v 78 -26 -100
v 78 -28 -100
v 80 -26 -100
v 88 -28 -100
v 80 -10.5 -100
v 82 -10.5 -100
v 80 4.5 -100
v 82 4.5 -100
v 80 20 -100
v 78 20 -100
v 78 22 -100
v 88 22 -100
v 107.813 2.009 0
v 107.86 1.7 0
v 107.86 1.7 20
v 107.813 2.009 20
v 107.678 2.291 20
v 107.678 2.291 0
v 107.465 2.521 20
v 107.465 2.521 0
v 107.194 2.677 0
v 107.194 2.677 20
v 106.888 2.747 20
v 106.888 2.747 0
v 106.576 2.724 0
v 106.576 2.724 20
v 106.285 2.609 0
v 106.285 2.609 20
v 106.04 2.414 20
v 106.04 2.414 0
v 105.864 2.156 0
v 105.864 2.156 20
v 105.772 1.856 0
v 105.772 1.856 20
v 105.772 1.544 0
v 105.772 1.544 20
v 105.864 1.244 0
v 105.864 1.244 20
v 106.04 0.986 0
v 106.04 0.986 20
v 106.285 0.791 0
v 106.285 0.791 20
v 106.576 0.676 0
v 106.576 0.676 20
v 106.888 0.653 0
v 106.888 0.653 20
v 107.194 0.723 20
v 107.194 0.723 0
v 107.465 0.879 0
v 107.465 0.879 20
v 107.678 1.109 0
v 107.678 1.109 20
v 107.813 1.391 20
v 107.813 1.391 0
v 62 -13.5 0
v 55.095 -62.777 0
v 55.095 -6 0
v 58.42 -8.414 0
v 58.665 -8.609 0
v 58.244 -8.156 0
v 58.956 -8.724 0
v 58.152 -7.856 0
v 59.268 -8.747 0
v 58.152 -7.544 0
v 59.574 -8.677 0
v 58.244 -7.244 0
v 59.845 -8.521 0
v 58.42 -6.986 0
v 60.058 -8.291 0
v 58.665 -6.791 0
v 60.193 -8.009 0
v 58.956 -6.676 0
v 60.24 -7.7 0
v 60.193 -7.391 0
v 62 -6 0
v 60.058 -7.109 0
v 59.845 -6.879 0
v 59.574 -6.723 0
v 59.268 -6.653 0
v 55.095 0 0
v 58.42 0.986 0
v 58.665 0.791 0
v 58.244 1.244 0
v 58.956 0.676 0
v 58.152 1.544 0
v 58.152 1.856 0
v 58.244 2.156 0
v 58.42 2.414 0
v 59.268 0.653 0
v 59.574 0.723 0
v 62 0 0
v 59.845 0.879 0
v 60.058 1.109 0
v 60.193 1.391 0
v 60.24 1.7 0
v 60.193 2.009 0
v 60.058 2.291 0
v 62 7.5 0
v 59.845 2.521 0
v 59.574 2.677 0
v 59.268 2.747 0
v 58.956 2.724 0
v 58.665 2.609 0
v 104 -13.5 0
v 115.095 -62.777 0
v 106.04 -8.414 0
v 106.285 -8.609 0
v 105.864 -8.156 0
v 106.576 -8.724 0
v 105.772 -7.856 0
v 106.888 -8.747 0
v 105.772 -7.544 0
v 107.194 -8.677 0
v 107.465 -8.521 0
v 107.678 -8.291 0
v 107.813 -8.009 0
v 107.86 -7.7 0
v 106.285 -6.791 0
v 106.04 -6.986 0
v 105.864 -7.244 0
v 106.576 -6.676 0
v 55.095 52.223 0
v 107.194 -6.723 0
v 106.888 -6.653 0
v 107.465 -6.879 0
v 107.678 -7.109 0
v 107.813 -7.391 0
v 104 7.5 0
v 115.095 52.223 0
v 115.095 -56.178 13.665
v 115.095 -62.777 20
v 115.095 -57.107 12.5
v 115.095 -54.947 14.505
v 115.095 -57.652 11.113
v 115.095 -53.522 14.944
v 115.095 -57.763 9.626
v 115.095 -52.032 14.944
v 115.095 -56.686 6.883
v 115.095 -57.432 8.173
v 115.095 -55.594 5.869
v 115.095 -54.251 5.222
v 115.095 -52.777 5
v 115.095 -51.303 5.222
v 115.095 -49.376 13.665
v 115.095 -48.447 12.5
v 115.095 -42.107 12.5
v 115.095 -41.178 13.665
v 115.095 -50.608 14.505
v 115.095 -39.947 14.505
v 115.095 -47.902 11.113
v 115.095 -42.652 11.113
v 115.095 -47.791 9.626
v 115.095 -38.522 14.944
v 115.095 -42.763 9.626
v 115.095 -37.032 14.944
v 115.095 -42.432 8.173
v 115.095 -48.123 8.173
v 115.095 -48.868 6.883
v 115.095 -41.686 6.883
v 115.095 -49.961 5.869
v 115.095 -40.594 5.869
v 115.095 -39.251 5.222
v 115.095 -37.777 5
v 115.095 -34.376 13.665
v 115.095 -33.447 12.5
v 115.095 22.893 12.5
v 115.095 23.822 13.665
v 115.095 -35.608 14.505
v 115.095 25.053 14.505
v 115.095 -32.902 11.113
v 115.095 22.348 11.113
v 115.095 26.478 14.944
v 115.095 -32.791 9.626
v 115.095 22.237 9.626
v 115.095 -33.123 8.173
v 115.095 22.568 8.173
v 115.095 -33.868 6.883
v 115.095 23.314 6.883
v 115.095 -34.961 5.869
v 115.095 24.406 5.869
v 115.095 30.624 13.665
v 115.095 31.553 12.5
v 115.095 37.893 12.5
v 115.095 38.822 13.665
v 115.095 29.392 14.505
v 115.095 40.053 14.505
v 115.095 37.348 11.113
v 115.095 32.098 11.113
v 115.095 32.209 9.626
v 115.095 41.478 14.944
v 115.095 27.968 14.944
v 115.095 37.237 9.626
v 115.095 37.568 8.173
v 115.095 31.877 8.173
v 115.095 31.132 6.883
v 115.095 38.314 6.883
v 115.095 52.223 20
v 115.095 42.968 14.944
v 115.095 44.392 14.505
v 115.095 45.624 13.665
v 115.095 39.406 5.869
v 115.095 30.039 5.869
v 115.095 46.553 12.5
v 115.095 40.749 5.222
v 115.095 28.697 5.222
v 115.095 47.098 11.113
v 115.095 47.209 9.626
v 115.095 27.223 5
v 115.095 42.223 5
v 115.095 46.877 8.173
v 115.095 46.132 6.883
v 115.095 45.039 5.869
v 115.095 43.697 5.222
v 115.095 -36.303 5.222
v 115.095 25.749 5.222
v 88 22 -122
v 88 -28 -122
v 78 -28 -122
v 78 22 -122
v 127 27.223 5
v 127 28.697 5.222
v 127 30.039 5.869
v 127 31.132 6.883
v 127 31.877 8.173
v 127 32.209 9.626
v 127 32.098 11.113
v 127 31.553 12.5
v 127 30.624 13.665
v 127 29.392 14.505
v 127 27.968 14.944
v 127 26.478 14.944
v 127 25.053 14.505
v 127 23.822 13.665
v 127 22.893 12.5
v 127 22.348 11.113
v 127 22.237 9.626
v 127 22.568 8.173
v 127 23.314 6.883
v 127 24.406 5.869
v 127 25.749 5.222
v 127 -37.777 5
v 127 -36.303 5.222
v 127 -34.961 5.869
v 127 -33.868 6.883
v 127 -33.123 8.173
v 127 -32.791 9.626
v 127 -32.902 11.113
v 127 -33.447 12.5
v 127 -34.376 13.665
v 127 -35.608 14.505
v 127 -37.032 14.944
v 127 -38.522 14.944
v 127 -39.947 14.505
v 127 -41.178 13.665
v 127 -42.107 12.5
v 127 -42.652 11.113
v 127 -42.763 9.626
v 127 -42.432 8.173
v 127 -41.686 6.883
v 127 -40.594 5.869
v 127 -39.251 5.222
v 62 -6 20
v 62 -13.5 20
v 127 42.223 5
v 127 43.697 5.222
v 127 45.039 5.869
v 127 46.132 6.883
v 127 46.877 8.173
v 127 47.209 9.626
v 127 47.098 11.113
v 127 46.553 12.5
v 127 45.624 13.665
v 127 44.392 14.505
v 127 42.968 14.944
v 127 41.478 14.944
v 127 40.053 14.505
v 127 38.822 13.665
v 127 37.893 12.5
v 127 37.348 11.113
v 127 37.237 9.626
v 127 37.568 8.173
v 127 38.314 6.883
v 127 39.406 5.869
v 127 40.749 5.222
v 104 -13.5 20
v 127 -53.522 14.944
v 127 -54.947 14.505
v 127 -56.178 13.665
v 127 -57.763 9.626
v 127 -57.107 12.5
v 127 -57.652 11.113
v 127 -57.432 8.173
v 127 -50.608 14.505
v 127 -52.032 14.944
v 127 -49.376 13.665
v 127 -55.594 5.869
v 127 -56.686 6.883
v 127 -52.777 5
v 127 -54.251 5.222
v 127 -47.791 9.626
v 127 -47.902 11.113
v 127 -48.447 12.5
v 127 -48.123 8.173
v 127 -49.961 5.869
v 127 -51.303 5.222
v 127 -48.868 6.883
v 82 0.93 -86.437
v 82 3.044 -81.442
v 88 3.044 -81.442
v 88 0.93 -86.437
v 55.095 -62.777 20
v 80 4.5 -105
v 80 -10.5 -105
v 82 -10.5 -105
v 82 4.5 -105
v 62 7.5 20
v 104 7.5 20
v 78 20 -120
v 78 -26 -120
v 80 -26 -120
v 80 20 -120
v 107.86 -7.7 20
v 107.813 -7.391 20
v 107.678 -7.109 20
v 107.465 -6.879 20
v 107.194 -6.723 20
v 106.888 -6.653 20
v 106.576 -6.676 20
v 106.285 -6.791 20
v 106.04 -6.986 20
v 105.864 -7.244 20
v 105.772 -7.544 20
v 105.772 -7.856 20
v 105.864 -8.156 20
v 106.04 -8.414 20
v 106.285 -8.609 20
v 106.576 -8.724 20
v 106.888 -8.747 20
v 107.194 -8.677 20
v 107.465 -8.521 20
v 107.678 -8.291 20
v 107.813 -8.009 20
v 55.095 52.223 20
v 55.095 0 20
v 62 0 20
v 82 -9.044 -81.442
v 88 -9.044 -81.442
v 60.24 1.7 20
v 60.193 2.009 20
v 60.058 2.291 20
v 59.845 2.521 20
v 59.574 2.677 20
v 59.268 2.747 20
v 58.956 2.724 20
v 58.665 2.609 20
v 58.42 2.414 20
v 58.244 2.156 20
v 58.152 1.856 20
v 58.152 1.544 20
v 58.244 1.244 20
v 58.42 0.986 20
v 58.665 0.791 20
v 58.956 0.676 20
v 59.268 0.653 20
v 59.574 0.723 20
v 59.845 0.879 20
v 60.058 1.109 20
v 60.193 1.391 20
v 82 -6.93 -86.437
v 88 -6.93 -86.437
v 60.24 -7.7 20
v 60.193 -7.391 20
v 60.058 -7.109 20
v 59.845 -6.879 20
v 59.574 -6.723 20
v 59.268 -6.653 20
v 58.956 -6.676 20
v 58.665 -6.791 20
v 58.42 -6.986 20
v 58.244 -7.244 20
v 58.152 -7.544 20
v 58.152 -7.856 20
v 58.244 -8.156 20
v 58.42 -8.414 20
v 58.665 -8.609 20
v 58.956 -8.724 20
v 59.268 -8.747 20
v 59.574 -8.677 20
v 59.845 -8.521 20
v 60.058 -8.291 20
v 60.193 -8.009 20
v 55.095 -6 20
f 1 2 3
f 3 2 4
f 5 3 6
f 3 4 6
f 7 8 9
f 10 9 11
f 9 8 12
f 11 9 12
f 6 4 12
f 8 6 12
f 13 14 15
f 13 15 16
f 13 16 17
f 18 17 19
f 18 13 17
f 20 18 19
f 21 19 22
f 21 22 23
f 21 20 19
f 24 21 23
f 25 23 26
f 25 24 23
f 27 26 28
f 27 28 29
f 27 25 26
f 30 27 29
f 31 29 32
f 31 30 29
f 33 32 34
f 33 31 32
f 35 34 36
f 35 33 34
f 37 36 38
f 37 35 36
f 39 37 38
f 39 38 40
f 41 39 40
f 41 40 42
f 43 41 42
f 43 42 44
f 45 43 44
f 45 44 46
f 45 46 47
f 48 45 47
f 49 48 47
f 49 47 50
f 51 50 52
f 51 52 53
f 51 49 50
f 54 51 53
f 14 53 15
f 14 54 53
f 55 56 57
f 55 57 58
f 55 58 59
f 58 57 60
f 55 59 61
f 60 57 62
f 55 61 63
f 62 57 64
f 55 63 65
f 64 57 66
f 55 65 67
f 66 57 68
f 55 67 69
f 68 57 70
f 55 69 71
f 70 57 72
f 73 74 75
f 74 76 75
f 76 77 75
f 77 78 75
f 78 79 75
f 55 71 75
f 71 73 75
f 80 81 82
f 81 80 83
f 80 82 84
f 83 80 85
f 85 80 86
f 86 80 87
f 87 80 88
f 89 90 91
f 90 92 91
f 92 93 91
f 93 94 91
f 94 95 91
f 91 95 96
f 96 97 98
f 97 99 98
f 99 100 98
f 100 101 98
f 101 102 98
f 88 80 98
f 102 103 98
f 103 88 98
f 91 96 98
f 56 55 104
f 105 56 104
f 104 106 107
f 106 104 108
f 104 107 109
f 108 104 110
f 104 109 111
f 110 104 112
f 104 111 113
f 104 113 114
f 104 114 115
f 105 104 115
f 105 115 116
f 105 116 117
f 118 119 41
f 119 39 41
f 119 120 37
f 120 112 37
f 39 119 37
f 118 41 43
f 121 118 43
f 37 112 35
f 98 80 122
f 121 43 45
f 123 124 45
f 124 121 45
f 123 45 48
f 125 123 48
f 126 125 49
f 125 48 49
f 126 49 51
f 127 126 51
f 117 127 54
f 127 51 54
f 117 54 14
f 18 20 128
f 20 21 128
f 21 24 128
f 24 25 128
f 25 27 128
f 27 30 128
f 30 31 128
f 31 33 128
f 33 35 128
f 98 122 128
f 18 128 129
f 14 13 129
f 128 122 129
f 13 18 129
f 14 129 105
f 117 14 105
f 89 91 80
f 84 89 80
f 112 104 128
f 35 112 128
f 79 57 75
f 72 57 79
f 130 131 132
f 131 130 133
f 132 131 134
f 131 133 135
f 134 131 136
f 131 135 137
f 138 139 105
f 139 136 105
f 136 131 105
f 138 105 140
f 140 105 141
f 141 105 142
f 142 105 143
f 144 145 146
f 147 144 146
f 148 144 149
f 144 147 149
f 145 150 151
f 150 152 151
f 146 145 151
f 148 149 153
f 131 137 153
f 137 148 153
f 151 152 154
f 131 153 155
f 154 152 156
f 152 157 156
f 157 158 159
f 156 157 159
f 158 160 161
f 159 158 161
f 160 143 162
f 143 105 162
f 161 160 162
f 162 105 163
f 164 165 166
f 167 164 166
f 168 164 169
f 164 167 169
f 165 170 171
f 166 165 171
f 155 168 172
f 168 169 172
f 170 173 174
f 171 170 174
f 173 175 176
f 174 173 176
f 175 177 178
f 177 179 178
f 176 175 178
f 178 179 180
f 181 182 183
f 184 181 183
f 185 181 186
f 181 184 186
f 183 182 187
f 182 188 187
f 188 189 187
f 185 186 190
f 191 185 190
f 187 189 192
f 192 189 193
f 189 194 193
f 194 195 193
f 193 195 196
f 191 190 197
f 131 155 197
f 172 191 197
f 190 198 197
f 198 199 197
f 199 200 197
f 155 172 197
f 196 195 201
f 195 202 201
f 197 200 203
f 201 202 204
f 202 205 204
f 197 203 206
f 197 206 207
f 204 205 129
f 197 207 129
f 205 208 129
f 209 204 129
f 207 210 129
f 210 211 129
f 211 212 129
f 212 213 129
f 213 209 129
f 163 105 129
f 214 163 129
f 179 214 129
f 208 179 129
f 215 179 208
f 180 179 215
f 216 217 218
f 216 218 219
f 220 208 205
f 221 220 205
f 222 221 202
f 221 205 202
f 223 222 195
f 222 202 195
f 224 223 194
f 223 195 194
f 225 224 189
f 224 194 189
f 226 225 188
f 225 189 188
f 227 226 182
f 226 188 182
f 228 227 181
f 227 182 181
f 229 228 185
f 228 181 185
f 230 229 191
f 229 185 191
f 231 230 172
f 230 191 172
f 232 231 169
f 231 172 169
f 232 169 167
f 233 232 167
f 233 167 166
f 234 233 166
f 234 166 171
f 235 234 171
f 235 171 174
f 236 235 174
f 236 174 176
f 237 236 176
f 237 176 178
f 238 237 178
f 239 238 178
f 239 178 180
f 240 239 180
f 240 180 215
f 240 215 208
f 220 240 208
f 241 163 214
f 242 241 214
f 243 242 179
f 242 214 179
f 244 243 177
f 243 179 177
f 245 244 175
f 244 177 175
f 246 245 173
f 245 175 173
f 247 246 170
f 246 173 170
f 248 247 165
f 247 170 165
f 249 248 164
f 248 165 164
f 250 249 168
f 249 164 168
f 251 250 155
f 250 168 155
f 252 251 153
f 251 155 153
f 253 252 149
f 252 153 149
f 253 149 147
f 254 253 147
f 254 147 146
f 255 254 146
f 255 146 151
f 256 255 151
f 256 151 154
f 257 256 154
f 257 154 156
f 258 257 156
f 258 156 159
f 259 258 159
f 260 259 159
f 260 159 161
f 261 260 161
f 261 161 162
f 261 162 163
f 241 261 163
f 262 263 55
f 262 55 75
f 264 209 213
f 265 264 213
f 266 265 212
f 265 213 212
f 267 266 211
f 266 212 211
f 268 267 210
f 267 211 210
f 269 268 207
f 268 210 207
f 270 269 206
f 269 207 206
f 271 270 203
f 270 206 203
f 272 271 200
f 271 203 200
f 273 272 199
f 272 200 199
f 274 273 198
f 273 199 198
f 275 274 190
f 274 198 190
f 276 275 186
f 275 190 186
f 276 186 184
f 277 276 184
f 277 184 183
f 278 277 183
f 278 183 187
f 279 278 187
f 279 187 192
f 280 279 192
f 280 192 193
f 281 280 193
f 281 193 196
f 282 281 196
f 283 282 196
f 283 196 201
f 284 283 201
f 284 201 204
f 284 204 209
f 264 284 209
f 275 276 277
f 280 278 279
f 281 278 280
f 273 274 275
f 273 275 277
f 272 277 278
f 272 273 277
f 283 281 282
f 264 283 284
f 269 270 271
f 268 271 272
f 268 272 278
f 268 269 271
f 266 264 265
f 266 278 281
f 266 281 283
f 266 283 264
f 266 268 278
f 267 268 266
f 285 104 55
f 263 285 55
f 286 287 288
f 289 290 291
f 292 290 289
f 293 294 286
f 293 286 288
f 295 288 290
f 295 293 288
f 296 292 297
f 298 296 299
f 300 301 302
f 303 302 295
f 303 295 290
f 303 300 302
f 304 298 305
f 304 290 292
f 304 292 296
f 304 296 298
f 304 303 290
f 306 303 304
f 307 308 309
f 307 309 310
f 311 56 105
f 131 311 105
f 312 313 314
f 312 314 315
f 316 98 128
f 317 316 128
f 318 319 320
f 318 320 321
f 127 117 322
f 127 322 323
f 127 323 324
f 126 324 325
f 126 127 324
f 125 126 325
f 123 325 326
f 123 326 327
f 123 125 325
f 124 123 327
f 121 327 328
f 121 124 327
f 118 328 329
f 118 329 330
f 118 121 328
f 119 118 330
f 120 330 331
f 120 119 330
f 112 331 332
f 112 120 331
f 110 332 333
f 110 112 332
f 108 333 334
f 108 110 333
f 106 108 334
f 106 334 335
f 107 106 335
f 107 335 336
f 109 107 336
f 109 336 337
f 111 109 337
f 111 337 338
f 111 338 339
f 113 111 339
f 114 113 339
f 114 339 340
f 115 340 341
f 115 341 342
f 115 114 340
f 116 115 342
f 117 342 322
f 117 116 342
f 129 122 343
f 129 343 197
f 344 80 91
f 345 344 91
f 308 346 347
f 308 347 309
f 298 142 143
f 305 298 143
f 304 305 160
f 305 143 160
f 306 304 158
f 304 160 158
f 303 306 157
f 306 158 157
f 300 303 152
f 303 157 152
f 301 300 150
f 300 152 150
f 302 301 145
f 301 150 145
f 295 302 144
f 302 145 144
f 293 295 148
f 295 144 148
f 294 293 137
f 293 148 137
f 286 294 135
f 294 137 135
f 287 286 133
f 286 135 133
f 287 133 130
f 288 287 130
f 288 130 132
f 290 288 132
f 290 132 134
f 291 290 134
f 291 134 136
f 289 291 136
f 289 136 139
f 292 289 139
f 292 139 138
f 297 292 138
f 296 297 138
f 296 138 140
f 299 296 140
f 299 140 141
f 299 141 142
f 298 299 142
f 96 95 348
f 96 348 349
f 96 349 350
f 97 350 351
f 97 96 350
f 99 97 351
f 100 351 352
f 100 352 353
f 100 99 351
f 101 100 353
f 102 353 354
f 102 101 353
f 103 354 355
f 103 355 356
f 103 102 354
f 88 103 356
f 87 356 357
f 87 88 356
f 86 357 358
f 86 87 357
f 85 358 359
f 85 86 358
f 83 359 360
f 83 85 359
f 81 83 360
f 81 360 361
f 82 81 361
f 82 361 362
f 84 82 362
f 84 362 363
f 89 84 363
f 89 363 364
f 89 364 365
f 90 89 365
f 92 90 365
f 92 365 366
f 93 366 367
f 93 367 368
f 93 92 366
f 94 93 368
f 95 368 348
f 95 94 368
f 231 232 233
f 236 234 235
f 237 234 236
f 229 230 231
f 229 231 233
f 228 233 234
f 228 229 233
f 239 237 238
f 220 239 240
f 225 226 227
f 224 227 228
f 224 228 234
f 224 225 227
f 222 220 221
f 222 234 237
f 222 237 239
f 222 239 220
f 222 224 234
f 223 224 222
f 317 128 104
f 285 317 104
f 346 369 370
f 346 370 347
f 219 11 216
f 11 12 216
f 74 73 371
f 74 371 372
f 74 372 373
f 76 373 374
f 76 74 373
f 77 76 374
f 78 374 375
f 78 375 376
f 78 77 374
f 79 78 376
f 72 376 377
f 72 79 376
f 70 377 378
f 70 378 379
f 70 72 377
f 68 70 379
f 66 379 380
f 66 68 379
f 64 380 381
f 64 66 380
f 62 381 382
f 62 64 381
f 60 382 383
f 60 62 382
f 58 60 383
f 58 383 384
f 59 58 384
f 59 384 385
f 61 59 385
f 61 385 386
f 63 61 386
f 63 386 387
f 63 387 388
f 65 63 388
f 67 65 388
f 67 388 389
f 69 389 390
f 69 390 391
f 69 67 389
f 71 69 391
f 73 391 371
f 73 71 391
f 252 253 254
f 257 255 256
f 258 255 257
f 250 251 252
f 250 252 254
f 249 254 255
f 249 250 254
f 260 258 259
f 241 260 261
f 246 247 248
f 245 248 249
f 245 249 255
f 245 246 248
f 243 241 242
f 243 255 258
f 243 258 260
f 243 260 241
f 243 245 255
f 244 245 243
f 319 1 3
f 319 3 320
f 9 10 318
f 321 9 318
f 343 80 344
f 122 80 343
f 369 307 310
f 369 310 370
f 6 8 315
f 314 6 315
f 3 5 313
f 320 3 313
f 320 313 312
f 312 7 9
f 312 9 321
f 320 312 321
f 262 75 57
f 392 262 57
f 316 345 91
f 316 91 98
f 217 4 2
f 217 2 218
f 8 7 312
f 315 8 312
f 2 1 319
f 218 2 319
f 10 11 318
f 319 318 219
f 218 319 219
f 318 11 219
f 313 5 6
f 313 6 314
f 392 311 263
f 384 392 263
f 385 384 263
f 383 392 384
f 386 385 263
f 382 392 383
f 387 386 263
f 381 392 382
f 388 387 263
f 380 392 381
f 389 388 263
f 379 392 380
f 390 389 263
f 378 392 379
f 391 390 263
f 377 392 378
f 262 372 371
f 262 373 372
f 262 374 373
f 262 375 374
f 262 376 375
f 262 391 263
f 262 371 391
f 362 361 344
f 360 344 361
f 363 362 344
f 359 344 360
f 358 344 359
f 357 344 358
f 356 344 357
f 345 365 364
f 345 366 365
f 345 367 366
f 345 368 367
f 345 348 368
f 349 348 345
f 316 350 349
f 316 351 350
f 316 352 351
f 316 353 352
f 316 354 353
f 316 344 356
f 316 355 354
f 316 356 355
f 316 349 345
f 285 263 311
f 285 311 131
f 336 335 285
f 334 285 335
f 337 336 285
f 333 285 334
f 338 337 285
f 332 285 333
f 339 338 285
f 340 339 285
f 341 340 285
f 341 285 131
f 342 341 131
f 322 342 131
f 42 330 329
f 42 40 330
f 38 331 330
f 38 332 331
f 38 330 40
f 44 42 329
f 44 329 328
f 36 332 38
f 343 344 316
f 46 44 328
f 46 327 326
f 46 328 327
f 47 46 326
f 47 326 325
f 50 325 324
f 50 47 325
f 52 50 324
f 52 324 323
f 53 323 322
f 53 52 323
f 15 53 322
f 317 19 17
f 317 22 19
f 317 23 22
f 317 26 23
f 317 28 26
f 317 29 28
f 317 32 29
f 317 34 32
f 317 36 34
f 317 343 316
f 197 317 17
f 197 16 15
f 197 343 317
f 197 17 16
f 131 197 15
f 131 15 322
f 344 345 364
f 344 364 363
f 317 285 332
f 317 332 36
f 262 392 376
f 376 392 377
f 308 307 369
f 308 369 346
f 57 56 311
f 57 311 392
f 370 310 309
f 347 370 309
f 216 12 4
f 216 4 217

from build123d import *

# Parameters (mm, degrees)
SKETCH_5_W           = 60
SKETCH_5_H           = 115
EXTRUDE_2_DEPTH      = 20
SKETCH_1_R           = 1.05
CUT_EXTRUDE_4_DEPTH  = 20
SKETCH_6_R           = 5
EXTRUDE_3_DEPTH      = 12
EXTRUDE_6_DEPTH      = 6
EXTRUDE_6_DEPTH_BACK = 4
SKETCH_13_W          = 22
SKETCH_13_H          = 50
SKETCH_16_W          = 20
SKETCH_16_H          = 46
CUT_EXTRUDE_9_DEPTH  = 2
SKETCH_17_W          = 5
SKETCH_17_H          = 15
CUT_EXTRUDE_10_DEPTH = 4
EXTRUDE_7_DEPTH      = 6


with BuildPart() as part:
    # 草圖5 → 填料-伸長2 (new body)
    with BuildSketch(Plane.XY):
        with Locations((85.095319229, -5.277137892)):
            Rectangle(SKETCH_5_W, SKETCH_5_H)
    extrude(amount=EXTRUDE_2_DEPTH)

    # 草圖1 → 除料-伸長4 (cut)
    with BuildSketch(Plane.XY):
        with Locations((59.19, 1.7)):
            Circle(SKETCH_1_R)
        with Locations((106.81, 1.7)):
            Circle(SKETCH_1_R)
        with Locations((106.81, -7.7)):
            Circle(SKETCH_1_R)
        with Locations((59.19, -7.7)):
            Circle(SKETCH_1_R)
        Polygon((55, -3), (55, 0), (62, 0), (62, 7.5), (104, 7.5), (104, -13.5), (62, -13.5), (62, -6), (55, -6), align=None)
    extrude(amount=CUT_EXTRUDE_4_DEPTH, mode=Mode.SUBTRACT)

    # 草圖6 → 填料-伸長3 (add)
    with BuildSketch(Plane(origin=(115, 0, 0), x_dir=(0, 0, -1), z_dir=(1, 0, 0))):
        with Locations((-10, 42.222862108)):
            Circle(SKETCH_6_R)
        with Locations((-10, 27.222862108)):
            Circle(SKETCH_6_R)
        with Locations((-10, -37.777137892)):
            Circle(SKETCH_6_R)
        with Locations((-10, -52.777137892)):
            Circle(SKETCH_6_R)
    extrude(amount=EXTRUDE_3_DEPTH)


with BuildPart() as body_2:
    # 草圖13 → 填料-伸長6 (new, two sides: drawn at the far end of the back side and taken through both)
    with BuildSketch(Plane(origin=(82, 0, 0), x_dir=(0, 0, -1), z_dir=(1, 0, 0)).offset(-EXTRUDE_6_DEPTH_BACK)):
        with Locations((111, -3)):
            Rectangle(SKETCH_13_W, SKETCH_13_H)
    extrude(amount=EXTRUDE_6_DEPTH + EXTRUDE_6_DEPTH_BACK)

    # 草圖16 → 除料-伸長9 (cut)
    with BuildSketch(Plane(origin=(78, 0, 0), x_dir=(0, 0, -1), z_dir=(1, 0, 0))):
        with Locations((110, -3)):
            Rectangle(SKETCH_16_W, SKETCH_16_H)
    extrude(amount=CUT_EXTRUDE_9_DEPTH, mode=Mode.SUBTRACT)

    # 草圖17 → 除料-伸長10 (cut)
    with BuildSketch(Plane(origin=(78, 0, 0), x_dir=(0, 0, -1), z_dir=(1, 0, 0))):
        with Locations((102.5, -3)):
            Rectangle(SKETCH_17_W, SKETCH_17_H)
    extrude(amount=CUT_EXTRUDE_10_DEPTH, mode=Mode.SUBTRACT)


with BuildPart() as body_3:
    # 草圖18 → 填料-伸長7 (new body)
    with BuildSketch(Plane(origin=(82, 0, 0), x_dir=(0, 0, -1), z_dir=(1, 0, 0))):
        Polygon((86.437354092, 0.930152969), (86.437354092, -6.930152969), (81.441973623, -9.043594565), (81.441973623, 3.043594565), align=None)
    extrude(amount=EXTRUDE_7_DEPTH)


solid = Compound([part.part, body_2.part, body_3.part])
